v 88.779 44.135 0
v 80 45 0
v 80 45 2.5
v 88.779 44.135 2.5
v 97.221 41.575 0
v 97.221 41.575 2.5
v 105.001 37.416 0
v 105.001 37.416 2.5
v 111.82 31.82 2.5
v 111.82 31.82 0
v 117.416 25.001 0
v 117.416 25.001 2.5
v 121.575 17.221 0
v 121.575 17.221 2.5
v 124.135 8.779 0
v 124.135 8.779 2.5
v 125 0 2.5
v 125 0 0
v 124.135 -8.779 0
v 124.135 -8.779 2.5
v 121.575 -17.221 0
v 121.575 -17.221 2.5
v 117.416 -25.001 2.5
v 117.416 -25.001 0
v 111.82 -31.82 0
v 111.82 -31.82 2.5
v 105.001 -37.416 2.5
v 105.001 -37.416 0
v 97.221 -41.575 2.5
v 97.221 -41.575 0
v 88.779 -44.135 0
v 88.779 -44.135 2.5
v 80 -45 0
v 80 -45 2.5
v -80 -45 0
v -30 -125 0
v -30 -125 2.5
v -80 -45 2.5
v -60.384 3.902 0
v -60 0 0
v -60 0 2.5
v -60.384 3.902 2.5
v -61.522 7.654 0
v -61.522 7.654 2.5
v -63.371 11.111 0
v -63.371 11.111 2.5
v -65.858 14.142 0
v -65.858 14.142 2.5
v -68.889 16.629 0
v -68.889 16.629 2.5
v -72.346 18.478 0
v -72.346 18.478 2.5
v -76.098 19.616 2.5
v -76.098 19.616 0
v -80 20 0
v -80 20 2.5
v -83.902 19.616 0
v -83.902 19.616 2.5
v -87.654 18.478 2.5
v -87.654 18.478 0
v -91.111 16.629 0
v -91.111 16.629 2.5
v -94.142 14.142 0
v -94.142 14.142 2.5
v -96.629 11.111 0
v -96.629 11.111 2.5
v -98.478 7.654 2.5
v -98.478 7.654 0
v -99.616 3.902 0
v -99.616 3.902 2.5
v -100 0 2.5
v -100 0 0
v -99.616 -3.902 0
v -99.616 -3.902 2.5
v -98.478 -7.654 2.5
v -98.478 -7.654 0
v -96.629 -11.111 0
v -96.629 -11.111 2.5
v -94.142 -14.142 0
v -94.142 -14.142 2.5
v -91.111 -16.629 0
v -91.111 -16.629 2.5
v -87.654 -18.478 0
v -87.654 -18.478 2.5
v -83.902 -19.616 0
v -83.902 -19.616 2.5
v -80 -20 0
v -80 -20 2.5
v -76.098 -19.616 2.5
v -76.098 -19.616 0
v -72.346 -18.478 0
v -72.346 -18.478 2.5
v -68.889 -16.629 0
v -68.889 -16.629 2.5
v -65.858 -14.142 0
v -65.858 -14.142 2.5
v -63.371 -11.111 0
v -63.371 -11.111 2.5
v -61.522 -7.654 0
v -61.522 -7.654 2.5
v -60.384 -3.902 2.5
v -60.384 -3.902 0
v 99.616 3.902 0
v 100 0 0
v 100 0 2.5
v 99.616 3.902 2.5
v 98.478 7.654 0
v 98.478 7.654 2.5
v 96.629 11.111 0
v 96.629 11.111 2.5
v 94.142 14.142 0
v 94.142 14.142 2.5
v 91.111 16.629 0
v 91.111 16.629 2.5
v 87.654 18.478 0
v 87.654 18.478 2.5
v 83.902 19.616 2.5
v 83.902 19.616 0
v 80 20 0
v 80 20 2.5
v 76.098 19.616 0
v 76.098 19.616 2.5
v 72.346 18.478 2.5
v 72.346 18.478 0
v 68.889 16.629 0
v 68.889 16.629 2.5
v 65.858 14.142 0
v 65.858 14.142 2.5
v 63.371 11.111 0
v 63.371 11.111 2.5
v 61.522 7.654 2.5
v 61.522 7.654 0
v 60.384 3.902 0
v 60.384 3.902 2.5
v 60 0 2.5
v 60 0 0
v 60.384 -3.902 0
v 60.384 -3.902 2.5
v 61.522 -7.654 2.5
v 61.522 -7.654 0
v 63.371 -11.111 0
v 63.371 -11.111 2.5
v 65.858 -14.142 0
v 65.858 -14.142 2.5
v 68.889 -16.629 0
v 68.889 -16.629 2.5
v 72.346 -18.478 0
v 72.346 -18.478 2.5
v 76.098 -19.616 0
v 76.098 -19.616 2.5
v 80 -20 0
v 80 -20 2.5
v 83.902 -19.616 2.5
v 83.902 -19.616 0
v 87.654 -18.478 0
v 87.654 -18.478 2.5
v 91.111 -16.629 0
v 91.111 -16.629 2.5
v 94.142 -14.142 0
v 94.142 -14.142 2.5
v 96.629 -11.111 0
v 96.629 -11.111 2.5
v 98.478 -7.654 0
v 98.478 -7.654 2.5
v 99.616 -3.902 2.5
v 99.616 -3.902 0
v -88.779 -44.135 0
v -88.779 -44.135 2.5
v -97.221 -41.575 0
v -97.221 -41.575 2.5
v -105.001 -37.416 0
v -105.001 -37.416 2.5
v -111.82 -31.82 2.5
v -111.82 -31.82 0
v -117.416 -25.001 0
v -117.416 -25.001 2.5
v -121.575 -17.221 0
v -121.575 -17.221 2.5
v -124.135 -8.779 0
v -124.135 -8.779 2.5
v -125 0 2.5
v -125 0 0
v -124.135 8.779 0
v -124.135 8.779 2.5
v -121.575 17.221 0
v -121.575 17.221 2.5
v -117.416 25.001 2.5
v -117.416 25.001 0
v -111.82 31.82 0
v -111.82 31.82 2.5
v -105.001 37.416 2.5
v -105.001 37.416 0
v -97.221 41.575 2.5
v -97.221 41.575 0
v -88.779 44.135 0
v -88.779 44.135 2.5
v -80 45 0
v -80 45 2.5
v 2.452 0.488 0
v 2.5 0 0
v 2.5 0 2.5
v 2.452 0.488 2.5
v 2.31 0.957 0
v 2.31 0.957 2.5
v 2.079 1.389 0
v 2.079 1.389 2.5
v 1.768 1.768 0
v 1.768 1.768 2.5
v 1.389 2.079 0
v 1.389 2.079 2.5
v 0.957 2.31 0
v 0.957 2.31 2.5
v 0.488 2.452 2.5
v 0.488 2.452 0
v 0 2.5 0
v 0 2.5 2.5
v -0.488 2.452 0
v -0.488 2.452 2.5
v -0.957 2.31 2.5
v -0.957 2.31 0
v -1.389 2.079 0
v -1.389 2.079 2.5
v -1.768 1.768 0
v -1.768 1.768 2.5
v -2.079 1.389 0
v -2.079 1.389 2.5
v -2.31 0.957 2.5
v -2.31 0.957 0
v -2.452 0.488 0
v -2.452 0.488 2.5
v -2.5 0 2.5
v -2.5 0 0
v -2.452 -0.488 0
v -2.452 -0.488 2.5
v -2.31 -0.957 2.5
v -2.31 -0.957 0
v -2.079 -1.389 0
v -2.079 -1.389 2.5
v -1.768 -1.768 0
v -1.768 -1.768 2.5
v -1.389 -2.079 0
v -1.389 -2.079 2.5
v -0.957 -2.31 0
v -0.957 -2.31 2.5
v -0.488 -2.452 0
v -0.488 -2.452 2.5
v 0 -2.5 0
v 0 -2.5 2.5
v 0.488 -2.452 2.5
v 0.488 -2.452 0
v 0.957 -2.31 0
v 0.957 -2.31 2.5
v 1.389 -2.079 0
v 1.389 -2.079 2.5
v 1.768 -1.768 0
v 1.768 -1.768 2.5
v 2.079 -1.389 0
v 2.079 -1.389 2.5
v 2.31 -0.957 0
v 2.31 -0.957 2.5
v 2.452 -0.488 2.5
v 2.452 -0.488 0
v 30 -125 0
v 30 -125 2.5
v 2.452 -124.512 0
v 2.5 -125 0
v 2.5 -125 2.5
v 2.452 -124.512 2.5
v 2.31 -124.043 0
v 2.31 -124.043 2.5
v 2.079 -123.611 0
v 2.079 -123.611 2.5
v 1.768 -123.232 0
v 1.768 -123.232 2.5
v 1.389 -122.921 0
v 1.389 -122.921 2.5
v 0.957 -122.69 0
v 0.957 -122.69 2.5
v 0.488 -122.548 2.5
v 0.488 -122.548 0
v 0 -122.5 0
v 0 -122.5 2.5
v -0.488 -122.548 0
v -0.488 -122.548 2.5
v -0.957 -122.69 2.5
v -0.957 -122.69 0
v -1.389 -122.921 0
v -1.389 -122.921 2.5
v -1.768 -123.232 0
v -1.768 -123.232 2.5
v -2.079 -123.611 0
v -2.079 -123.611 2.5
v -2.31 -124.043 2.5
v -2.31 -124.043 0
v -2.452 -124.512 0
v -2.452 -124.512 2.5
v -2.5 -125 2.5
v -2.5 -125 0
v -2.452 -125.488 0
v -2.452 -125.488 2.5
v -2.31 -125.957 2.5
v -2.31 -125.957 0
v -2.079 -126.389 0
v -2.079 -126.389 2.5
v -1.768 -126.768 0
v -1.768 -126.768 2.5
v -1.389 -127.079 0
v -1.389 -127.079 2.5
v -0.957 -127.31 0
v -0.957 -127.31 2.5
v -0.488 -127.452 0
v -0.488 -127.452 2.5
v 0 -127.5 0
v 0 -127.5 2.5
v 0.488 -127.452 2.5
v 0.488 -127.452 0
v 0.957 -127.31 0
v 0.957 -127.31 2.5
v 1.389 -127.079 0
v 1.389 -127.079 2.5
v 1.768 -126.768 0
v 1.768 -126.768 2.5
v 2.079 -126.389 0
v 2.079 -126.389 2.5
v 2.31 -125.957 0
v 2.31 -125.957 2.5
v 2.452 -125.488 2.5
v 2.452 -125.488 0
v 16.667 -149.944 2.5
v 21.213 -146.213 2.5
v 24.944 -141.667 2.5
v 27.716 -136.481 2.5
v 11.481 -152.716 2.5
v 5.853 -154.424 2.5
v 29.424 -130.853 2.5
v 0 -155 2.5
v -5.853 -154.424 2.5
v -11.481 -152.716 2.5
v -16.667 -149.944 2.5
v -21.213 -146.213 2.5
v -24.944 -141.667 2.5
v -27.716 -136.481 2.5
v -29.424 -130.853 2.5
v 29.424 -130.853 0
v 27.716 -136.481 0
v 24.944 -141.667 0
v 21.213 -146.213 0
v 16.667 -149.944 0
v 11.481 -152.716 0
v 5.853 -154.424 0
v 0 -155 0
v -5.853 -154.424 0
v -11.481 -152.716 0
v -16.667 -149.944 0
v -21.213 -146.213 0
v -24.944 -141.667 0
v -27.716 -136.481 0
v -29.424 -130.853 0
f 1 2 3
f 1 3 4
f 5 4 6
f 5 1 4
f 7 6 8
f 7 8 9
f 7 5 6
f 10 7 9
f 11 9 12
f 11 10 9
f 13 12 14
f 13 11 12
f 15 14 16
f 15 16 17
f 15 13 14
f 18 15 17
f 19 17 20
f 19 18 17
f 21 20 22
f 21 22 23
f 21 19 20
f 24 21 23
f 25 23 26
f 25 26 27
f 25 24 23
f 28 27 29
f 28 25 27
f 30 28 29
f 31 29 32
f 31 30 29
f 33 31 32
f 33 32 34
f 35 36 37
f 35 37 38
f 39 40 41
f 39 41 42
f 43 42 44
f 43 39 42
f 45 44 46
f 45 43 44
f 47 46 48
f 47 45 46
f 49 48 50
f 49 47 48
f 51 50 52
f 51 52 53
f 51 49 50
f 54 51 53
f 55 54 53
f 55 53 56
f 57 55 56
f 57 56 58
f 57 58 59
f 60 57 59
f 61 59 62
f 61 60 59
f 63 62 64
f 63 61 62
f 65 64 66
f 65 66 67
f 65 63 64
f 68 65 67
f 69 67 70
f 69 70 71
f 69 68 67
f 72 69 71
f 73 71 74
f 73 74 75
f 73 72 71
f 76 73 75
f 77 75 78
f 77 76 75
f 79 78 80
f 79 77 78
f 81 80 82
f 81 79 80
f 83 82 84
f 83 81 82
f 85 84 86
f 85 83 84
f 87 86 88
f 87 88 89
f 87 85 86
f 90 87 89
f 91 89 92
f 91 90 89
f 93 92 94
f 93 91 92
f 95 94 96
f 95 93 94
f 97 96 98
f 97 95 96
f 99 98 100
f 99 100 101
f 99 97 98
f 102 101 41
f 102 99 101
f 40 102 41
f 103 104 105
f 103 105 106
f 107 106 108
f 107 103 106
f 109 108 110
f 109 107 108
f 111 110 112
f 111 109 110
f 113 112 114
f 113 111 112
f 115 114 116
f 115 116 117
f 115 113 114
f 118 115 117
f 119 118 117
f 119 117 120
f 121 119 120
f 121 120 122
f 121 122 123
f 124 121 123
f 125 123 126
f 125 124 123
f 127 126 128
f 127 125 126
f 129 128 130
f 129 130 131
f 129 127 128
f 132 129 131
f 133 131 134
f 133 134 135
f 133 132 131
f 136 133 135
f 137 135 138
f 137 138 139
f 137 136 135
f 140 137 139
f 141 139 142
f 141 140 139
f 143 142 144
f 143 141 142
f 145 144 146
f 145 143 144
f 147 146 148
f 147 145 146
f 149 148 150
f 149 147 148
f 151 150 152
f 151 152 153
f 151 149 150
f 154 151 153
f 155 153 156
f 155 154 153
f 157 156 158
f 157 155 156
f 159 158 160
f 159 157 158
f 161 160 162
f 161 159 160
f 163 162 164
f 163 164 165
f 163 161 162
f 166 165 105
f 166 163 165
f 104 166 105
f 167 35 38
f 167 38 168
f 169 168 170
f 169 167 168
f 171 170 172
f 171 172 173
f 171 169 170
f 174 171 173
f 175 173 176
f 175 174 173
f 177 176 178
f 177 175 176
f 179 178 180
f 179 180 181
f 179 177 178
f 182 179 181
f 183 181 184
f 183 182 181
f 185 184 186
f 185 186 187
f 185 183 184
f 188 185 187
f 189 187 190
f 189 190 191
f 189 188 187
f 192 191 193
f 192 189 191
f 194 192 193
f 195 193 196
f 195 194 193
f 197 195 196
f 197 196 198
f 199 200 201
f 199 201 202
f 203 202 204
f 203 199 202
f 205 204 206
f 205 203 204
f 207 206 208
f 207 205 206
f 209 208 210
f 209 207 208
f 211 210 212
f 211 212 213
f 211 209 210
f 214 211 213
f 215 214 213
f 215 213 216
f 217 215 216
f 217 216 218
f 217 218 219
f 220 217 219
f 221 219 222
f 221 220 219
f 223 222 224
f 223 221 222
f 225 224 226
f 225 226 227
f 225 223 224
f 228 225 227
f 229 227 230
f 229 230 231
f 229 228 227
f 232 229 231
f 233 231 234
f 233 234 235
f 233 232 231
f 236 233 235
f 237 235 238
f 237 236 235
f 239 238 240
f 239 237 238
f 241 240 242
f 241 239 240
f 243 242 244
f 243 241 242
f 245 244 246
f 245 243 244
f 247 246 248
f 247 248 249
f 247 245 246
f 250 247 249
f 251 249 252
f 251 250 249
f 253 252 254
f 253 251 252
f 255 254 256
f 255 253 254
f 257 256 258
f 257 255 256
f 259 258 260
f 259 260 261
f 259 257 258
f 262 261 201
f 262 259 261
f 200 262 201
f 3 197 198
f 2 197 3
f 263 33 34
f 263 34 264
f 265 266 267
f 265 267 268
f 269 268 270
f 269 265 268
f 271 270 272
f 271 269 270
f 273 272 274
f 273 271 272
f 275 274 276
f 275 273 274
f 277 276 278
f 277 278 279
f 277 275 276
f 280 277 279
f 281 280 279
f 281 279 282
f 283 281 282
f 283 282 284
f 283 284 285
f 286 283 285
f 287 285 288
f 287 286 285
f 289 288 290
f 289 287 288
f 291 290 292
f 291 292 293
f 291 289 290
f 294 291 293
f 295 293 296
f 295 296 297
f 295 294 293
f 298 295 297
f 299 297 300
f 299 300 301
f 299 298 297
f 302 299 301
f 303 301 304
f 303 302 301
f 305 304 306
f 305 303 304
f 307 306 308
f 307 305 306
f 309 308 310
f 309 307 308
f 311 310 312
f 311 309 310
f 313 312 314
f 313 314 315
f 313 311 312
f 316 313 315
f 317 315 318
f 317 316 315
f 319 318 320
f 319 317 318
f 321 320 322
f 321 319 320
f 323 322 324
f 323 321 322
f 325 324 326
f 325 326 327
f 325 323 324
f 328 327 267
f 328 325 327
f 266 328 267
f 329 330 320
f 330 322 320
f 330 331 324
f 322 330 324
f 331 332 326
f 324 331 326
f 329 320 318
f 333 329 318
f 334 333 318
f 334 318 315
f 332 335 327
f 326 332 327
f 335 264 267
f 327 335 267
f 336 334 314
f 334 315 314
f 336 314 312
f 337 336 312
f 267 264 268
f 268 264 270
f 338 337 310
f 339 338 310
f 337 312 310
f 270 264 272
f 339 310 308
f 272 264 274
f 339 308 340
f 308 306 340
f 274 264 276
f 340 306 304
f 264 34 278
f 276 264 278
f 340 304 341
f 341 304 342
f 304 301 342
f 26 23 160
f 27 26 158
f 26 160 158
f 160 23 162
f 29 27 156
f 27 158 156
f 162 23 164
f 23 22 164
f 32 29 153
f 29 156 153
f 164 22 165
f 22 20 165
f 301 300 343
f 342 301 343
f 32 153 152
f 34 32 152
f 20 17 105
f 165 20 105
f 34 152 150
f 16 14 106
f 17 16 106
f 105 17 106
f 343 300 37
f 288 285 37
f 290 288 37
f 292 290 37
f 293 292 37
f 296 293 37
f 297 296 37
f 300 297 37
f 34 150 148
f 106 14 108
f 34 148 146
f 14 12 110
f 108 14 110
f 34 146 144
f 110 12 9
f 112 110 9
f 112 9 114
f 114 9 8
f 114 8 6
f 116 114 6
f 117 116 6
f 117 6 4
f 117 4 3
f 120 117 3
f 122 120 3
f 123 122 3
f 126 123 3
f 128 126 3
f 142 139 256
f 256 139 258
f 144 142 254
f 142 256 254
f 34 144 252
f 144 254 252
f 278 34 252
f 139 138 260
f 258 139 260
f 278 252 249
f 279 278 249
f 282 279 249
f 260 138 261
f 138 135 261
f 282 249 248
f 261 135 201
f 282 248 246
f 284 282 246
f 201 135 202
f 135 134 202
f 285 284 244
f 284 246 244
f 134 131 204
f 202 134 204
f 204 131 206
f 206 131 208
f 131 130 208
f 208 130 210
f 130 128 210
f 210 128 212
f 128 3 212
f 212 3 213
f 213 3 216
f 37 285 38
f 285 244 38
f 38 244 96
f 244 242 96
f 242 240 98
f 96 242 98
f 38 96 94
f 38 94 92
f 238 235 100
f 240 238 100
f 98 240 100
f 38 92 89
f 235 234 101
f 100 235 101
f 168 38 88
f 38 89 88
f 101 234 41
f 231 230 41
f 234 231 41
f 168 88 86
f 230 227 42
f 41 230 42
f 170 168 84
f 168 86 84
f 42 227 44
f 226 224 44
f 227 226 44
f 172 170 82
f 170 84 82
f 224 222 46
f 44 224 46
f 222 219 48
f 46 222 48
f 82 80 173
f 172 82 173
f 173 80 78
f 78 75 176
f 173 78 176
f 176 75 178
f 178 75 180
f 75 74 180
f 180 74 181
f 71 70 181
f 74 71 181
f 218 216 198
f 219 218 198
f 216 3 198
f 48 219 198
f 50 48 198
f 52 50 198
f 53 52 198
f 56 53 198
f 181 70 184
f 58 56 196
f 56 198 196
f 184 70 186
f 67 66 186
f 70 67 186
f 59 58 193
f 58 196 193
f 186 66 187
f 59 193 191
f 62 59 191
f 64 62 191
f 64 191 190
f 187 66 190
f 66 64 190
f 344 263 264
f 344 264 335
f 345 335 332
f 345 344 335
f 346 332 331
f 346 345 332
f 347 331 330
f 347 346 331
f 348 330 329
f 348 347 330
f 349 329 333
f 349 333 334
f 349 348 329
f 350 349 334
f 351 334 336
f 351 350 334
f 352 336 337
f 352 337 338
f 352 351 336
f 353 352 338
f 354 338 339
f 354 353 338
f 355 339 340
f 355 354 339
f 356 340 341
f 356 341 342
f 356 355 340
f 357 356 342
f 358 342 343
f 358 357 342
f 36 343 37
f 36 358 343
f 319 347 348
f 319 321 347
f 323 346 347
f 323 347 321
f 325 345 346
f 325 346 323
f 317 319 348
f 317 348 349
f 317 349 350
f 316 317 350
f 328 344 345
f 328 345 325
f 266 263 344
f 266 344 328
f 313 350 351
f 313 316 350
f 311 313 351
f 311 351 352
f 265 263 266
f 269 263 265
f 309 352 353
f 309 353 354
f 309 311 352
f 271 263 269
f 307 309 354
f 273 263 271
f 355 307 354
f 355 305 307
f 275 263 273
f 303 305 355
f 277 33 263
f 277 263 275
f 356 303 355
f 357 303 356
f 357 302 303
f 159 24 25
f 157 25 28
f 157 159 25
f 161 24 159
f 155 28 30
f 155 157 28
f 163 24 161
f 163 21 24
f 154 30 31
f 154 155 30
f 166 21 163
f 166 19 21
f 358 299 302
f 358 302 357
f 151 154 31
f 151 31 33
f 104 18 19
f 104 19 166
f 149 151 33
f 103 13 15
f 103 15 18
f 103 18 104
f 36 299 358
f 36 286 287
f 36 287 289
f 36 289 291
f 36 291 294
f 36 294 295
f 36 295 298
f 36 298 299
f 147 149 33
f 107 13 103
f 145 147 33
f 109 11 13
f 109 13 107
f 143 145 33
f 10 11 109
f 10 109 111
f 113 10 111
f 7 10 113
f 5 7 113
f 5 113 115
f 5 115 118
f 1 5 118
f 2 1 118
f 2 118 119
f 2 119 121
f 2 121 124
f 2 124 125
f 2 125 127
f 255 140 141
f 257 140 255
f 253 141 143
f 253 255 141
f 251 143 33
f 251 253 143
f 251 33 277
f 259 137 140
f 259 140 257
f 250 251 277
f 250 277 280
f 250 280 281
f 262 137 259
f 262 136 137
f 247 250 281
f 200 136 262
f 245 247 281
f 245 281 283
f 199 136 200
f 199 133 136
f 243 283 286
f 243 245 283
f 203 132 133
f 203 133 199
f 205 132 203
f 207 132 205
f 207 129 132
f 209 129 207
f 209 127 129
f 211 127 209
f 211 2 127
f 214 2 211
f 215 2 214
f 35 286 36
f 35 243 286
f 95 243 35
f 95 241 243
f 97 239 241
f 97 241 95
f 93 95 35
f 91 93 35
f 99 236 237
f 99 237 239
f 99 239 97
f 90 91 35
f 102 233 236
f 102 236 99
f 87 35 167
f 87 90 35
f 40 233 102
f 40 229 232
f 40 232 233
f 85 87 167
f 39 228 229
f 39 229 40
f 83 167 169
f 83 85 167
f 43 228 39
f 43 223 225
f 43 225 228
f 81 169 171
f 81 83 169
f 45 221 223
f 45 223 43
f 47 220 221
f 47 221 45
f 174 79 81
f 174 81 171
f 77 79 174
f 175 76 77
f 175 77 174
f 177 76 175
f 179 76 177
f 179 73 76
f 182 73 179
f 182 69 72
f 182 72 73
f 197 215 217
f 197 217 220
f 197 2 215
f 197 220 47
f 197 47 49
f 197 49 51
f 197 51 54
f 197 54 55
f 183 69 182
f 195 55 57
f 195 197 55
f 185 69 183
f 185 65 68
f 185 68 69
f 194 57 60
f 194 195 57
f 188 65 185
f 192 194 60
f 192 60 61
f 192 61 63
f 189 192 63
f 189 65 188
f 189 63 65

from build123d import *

# Parameters (mm, degrees)
SKETCH1_R           = 20
SKETCH1_R_2         = 2.5
BOSS_EXTRUDE1_DEPTH = 2.5


with BuildPart() as part:
    # Sketch1 → Boss-Extrude1 (new body)
    with BuildSketch(Plane.XY):
        with BuildLine():
            Line((-80, 45), (80, 45))
            ThreePointArc((80, 45), (125, 0), (80, -45))
            Line((80, -45), (30, -125))
            ThreePointArc((30, -125), (0, -155), (-30, -125))
            Line((-30, -125), (-80, -45))
            ThreePointArc((-80, -45), (-125, 0), (-80, 45))
        make_face()
        with Locations((-80, 0)):
            Circle(SKETCH1_R, mode=Mode.SUBTRACT)
        with Locations((80, 0)):
            Circle(SKETCH1_R, mode=Mode.SUBTRACT)
        Circle(SKETCH1_R_2, mode=Mode.SUBTRACT)
        with Locations((0, -125)):
            Circle(SKETCH1_R_2, mode=Mode.SUBTRACT)
    extrude(amount=BOSS_EXTRUDE1_DEPTH)


solid = part.part
